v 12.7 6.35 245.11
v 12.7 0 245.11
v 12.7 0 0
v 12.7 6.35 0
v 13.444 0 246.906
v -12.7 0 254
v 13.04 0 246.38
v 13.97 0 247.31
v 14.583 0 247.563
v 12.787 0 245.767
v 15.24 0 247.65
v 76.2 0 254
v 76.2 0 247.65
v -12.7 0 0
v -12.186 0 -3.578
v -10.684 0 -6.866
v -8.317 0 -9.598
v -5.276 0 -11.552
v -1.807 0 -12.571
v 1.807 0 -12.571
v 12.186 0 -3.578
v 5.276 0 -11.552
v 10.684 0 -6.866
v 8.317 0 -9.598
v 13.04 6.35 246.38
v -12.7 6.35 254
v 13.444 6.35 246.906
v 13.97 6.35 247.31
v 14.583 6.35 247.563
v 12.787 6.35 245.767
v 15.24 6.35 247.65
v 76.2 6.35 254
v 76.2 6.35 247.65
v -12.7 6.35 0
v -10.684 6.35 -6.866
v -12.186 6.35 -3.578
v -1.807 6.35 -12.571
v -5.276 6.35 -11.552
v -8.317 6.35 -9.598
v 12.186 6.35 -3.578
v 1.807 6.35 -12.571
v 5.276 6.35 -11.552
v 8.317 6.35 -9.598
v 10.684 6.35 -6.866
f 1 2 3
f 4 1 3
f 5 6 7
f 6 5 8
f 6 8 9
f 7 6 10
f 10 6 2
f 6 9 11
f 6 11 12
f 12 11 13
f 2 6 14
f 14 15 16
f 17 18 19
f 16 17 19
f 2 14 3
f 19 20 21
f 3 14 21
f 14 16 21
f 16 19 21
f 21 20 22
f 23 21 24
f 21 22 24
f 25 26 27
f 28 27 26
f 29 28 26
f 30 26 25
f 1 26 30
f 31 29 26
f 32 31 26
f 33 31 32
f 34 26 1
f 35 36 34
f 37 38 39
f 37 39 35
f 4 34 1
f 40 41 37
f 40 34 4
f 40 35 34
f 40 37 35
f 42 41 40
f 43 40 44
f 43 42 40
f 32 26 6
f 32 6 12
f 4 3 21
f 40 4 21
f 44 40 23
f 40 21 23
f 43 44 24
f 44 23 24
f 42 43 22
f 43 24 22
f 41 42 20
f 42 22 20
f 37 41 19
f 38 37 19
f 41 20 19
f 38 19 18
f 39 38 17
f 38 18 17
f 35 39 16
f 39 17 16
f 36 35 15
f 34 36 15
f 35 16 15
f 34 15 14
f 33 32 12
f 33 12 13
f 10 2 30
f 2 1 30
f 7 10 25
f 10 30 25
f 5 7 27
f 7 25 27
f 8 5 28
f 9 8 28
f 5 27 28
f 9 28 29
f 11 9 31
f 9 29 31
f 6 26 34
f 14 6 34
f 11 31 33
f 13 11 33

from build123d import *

# Parameters (mm, degrees)
BOSS_EXTRUDE1_DEPTH = 6.35
SKETCH2_W           = 88.9
SKETCH2_H           = 6.35
BOSS_EXTRUDE2_DEPTH = 6.35
FILLET1_R           = 2.54


with BuildPart() as part:
    # Sketch1 → Boss-Extrude1 (new body)
    with BuildSketch(Plane(origin=(0, 0, 0), x_dir=(1, 0, 0), z_dir=(0, 1, 0))):
        with BuildLine():
            ThreePointArc((12.7, 0), (0, -12.7), (-12.7, 0))
            Line((-12.7, 0), (-12.7, -247.65))
            Line((-12.7, -247.65), (12.7, -247.65))
            Line((12.7, -247.65), (12.7, 0))
        make_face()
        with BuildLine():
            ThreePointArc((12.7, 0), (0, 12.7), (-12.7, 0))
            Line((-12.7, 0), (12.7, 0))
        make_face()
        with BuildLine():
            Line((12.7, 0), (-12.7, 0))
            ThreePointArc((-12.7, 0), (0, -12.7), (12.7, 0))
        make_face()
    extrude(amount=BOSS_EXTRUDE1_DEPTH)

    # Sketch2 → Boss-Extrude2 (add)
    with BuildSketch(Plane(origin=(0, 6.35, 0), x_dir=(1, 0, 0), z_dir=(0, 1, 0))):
        with Locations((31.75, -250.825)):
            Rectangle(SKETCH2_W, SKETCH2_H)
    extrude(amount=-BOSS_EXTRUDE2_DEPTH)

    # Fillet1
    fillet1_edges = [part.edges().sort_by_distance(p)[0] for p in [
        (12.7, 3.175, 247.65),
    ]]
    fillet(fillet1_edges, radius=FILLET1_R)


solid = part.part
